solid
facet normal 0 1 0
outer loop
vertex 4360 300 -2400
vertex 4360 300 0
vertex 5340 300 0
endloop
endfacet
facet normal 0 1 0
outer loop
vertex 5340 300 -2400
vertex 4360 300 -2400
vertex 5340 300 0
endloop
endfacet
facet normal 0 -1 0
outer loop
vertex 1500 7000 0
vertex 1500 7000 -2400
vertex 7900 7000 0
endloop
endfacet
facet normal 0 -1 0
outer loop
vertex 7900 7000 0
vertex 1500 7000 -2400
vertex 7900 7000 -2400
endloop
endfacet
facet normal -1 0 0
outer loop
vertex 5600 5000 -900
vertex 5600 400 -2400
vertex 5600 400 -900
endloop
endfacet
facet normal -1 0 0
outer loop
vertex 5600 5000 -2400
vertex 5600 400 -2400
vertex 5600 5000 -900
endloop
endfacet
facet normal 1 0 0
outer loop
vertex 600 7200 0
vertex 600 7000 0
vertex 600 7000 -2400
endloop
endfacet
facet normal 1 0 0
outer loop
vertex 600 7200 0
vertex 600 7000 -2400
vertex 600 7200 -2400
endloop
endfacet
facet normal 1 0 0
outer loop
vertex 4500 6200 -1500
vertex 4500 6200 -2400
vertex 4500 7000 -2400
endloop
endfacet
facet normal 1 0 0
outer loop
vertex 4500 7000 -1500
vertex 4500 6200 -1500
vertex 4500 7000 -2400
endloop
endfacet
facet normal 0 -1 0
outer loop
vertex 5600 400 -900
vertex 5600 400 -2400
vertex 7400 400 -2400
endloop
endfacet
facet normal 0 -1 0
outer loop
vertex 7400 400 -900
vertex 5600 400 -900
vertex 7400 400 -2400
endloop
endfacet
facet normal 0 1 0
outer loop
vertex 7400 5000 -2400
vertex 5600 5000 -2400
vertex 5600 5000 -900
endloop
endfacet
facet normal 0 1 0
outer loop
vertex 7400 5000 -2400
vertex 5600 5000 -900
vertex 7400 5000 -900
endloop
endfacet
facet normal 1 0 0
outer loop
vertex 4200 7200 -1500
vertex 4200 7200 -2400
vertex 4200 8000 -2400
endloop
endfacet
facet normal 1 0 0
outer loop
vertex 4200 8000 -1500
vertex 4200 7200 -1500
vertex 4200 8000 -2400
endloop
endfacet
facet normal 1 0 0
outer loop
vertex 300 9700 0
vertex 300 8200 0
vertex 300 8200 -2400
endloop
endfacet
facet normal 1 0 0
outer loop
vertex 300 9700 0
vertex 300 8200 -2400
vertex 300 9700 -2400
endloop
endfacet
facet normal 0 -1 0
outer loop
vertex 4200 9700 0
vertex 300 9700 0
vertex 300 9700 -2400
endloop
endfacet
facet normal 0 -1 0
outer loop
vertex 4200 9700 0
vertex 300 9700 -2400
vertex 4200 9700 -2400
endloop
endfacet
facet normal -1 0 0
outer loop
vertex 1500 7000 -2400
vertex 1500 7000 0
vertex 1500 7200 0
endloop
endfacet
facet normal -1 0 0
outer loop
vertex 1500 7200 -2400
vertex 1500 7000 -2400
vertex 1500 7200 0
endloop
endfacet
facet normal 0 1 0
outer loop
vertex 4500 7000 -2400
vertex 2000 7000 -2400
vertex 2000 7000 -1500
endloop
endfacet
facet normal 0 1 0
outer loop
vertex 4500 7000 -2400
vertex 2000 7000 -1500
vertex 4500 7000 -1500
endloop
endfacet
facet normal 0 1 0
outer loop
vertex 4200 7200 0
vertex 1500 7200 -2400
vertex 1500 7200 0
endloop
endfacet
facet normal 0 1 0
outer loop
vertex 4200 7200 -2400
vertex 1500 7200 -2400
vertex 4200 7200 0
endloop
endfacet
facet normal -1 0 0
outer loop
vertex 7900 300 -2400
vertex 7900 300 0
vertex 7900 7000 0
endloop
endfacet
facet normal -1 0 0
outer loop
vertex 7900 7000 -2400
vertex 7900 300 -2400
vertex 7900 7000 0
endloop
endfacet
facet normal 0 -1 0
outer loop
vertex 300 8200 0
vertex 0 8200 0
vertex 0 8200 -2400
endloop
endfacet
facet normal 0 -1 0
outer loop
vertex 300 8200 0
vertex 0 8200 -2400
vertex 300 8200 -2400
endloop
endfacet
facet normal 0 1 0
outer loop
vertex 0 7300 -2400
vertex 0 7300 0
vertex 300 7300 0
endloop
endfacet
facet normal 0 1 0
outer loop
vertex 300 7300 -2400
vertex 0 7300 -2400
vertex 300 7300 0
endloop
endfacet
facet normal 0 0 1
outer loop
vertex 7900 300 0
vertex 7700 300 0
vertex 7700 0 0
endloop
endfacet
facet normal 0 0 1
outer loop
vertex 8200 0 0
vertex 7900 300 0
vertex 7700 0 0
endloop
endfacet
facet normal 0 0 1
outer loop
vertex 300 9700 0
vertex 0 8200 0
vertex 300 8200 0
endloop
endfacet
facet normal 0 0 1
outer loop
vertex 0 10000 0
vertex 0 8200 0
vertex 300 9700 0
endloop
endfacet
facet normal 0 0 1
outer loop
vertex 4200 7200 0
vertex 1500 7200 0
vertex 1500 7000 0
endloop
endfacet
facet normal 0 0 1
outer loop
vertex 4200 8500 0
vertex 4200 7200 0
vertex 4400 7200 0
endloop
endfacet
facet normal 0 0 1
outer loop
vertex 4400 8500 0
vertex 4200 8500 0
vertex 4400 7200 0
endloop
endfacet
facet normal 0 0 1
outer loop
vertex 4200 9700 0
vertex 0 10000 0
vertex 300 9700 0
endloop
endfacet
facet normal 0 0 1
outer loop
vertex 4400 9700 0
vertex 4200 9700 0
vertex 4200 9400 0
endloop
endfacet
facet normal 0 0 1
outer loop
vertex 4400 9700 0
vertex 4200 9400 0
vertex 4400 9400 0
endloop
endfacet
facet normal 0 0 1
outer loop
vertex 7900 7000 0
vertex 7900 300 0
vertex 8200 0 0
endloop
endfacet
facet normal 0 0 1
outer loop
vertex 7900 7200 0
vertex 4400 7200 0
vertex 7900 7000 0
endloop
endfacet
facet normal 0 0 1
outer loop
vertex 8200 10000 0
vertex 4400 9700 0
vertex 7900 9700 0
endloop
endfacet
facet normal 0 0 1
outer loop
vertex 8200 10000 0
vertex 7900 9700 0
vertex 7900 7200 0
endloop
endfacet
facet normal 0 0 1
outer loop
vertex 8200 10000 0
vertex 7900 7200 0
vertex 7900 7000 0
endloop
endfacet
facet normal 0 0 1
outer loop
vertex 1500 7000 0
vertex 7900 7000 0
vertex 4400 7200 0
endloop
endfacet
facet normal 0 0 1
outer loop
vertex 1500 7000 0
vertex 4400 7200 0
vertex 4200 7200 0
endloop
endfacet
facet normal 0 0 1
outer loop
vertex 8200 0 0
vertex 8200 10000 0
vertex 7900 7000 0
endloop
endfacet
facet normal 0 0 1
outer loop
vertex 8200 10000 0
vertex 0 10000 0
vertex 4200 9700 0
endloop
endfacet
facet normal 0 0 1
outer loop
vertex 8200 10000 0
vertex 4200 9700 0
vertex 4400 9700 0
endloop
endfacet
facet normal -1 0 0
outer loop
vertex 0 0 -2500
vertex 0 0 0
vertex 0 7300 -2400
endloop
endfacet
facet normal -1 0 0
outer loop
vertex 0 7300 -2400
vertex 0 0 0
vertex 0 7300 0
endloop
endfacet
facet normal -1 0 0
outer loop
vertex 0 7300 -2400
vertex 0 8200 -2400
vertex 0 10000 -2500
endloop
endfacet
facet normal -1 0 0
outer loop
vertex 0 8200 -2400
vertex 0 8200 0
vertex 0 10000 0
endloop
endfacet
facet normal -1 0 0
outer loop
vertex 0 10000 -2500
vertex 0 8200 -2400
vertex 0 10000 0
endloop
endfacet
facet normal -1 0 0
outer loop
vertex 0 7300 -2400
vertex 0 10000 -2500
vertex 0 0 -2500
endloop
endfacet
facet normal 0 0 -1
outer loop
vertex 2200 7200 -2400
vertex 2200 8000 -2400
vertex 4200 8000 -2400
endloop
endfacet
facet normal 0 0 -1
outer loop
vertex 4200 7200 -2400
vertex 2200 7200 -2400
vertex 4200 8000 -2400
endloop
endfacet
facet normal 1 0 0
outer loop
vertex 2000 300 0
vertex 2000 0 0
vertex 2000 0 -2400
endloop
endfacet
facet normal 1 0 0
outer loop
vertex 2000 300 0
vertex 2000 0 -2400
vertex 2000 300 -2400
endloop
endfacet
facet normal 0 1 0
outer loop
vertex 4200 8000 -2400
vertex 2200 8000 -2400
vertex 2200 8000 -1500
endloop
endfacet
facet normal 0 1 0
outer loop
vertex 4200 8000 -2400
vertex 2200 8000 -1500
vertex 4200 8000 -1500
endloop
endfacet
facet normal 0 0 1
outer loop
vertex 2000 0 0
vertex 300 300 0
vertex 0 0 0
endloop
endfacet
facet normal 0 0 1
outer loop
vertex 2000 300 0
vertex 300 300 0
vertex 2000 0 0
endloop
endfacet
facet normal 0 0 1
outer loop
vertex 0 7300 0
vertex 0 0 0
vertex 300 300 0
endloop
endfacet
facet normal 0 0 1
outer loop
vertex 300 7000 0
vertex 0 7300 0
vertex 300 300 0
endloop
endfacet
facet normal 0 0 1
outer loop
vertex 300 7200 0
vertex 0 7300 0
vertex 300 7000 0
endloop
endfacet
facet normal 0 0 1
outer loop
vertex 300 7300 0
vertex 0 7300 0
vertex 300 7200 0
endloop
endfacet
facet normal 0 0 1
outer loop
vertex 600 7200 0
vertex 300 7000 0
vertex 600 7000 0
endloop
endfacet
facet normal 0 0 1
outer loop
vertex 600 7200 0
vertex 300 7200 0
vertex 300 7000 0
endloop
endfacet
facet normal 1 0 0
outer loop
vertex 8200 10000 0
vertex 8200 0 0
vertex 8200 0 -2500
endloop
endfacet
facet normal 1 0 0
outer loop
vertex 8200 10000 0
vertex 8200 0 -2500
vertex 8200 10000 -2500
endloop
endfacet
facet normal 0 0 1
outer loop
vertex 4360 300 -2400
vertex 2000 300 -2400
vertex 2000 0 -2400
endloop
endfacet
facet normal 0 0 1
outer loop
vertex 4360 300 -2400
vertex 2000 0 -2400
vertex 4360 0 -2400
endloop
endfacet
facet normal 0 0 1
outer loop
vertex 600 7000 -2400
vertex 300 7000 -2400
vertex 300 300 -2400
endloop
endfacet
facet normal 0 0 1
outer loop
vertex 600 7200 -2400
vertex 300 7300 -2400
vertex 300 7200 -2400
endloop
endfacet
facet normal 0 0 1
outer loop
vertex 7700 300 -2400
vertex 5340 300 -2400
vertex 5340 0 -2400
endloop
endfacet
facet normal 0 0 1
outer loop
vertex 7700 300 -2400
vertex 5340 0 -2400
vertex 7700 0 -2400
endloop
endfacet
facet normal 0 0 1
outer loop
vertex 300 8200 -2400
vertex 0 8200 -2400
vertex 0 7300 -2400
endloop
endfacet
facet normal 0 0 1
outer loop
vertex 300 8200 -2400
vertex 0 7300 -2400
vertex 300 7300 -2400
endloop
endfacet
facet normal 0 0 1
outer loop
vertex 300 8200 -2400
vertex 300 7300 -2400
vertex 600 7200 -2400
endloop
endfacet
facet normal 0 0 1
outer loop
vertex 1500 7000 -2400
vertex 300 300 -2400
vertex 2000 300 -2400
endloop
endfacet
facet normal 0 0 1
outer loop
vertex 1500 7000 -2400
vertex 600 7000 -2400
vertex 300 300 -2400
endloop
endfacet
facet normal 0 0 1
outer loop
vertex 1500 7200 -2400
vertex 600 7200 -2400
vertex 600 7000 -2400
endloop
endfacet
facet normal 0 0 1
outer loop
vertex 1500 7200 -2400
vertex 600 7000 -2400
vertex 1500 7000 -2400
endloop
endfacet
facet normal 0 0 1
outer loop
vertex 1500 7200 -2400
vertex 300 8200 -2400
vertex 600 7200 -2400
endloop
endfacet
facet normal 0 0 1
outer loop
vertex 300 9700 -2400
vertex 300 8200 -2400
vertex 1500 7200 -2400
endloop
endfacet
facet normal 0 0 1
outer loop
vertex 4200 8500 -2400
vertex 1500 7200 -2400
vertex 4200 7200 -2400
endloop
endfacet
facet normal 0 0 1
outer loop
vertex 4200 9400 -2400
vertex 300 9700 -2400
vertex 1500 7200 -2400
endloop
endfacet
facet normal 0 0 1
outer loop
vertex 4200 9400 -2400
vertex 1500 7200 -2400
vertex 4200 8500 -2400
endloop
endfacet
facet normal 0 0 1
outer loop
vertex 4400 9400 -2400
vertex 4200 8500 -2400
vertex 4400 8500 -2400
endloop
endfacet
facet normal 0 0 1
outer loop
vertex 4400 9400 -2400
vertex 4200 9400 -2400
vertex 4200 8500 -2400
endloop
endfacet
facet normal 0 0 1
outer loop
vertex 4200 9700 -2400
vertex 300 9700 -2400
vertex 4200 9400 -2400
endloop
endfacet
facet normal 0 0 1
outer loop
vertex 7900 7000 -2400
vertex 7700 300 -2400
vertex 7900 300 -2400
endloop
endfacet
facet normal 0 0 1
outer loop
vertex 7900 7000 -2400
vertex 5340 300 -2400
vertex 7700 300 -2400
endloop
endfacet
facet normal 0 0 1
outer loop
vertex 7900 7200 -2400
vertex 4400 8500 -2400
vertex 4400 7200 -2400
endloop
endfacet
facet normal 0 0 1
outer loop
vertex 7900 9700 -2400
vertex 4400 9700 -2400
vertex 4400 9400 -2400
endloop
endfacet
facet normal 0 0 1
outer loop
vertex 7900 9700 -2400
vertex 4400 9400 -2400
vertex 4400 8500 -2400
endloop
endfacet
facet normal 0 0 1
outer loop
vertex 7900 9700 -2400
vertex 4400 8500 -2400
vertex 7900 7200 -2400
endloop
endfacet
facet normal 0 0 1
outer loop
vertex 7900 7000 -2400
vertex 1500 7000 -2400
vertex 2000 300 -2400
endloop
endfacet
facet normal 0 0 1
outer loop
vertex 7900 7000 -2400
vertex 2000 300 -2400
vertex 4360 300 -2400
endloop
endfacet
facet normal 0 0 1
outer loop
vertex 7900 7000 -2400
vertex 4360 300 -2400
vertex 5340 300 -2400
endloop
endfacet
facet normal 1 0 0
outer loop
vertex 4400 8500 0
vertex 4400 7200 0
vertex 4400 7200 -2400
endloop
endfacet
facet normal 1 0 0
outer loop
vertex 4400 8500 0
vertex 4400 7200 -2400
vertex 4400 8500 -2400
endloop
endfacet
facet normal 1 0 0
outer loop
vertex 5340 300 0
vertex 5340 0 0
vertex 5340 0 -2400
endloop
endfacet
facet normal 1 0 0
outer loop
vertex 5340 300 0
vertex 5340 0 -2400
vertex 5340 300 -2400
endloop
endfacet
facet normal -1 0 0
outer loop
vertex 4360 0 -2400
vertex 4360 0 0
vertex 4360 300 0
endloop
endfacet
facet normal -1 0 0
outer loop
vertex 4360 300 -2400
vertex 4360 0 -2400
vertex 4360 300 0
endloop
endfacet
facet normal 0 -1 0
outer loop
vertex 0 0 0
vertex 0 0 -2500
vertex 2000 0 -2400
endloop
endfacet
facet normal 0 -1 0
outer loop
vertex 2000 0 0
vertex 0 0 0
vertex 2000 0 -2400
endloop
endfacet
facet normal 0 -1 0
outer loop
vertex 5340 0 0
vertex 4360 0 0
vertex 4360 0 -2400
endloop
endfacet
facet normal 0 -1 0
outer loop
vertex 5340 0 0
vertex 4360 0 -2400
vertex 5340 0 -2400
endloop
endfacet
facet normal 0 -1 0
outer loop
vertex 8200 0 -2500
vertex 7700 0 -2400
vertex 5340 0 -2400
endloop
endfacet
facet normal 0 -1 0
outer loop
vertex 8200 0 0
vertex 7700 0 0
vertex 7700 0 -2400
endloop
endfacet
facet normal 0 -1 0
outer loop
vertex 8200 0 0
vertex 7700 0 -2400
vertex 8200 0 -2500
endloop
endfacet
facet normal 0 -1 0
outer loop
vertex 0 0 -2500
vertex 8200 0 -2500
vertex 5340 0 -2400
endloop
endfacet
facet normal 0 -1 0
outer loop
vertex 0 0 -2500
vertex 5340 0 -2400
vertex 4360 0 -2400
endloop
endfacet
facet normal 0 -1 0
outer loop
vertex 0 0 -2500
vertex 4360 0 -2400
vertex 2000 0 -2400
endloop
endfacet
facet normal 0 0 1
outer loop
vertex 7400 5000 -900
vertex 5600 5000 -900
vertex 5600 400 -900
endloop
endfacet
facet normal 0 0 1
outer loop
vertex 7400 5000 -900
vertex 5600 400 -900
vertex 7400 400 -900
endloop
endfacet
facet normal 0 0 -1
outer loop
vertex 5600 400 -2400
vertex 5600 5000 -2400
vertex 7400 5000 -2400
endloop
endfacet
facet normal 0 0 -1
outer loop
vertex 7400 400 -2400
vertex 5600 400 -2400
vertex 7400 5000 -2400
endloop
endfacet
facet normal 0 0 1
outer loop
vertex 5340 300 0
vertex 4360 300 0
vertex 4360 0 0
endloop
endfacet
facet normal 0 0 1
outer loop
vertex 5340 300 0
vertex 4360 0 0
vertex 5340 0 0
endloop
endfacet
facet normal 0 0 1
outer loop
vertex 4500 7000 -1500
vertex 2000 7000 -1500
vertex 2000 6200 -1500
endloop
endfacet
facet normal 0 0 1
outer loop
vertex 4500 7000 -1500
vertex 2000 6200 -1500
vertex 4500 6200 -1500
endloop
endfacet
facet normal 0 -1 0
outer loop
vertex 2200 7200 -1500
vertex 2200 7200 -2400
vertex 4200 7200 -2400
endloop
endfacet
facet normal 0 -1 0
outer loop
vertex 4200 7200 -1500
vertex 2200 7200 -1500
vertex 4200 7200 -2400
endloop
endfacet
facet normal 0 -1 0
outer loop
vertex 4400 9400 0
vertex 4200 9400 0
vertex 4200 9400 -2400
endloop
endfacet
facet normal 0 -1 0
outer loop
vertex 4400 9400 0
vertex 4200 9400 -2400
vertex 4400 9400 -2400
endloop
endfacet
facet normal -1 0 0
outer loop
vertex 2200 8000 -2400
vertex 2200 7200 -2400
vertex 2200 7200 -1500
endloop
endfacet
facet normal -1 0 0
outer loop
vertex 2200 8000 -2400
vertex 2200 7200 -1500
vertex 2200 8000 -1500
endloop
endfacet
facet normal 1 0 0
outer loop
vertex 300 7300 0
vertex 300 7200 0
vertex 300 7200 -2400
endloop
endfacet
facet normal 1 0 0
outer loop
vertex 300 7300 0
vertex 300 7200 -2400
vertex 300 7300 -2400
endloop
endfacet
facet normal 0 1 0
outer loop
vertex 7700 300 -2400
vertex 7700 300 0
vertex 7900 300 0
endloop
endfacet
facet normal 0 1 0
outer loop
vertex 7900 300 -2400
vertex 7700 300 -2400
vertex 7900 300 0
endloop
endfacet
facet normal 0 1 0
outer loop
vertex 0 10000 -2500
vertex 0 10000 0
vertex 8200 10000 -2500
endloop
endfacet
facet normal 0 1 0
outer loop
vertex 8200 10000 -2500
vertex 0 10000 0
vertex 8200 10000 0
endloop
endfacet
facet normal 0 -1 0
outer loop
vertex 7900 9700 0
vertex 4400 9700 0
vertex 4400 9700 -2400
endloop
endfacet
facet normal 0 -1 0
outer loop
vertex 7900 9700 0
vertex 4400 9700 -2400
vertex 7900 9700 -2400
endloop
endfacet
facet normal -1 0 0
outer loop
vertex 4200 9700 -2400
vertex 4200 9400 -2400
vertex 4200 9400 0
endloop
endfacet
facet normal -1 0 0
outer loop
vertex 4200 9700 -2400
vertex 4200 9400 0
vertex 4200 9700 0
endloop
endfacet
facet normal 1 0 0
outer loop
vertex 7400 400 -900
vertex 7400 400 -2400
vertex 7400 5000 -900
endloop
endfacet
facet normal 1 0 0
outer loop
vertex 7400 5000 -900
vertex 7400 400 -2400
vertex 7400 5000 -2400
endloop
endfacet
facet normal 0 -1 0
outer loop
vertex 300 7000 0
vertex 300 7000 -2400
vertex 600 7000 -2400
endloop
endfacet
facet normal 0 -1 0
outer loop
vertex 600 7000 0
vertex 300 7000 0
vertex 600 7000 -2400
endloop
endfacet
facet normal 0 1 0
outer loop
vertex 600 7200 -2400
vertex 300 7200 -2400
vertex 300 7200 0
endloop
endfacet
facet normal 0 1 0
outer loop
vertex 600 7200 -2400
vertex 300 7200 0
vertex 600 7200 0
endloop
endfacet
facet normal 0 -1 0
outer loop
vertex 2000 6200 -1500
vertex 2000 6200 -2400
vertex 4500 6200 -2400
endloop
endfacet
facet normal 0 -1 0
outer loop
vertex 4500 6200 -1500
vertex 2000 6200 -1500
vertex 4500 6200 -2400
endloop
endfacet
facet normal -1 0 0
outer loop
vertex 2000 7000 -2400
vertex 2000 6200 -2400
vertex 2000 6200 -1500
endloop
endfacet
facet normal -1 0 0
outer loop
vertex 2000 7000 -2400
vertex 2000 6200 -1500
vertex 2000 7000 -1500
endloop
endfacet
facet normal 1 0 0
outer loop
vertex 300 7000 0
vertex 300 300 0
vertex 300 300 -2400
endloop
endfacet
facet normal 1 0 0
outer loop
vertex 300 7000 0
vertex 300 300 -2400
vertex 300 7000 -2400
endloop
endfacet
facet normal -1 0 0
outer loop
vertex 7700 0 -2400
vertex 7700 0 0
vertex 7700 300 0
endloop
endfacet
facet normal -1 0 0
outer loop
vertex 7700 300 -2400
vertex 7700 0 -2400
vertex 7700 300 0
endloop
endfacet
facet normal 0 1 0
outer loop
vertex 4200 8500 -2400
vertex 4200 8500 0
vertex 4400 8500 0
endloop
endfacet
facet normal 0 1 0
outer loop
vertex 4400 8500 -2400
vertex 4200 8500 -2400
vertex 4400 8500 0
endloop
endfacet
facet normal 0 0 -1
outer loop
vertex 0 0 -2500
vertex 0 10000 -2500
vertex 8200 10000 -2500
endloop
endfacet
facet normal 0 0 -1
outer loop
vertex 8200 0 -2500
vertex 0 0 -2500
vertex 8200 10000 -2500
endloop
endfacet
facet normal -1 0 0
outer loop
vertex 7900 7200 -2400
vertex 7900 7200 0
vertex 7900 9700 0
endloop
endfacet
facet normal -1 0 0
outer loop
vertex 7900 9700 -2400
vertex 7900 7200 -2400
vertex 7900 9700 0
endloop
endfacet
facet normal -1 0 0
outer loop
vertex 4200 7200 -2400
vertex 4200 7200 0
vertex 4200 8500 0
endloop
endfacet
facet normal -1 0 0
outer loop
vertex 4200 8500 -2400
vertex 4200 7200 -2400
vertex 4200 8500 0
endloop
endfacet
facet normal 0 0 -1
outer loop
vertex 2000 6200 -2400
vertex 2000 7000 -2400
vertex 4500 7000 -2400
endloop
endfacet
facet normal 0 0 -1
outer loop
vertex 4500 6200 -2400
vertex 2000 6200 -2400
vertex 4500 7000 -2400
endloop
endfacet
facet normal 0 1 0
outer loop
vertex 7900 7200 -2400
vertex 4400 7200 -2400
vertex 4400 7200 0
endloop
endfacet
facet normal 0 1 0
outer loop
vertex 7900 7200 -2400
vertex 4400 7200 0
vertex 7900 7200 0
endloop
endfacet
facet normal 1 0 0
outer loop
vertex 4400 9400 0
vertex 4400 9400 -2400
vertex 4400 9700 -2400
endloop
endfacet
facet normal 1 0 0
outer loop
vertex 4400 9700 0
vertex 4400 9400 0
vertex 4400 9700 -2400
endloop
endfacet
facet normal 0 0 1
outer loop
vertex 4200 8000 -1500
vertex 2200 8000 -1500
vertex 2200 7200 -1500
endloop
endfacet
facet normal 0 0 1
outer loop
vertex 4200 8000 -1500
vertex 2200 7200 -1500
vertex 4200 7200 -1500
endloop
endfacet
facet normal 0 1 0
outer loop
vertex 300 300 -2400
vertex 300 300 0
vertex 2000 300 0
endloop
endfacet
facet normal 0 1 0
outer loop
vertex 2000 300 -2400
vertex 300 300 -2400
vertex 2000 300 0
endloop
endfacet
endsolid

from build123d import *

# Parameters (mm, degrees)
F0_W      = 8200
F0_H      = 10000
F3_DEPTH  = 2500
F1_W      = 7600
F1_H      = 9400
F4_DEPTH  = 2400
F2_W      = 2360
F2_H      = 300
F5_DEPTH  = 2400
F6_W      = 7600
F6_H      = 200
F7_DEPTH  = 2400
F8_W      = 200
F8_H      = 2500
F9_DEPTH  = 2400
F10_W     = 900
F10_H     = 200
F10_W_2   = 200
F10_H_2   = 900
F10_W_3   = 300
F11_DEPTH = 2400
F12_W     = 2000
F12_H     = 800
F13_DEPTH = 900
F14_W     = 1800
F14_H     = 4600
F15_DEPTH = 1500
F16_W     = 2500
F16_H     = 800
F17_DEPTH = 900


with BuildPart() as f3:
    # F0 (on Top) → F3 (new body)
    with BuildSketch(Plane.XY):
        with Locations((4100, 5000)):
            Rectangle(F0_W, F0_H)
    extrude(amount=-F3_DEPTH)

    # F1 (on face) → F4 (cut)
    with BuildSketch(Plane.XY):
        with Locations((4100, 5000)):
            Rectangle(F1_W, F1_H)
    extrude(amount=-F4_DEPTH, mode=Mode.SUBTRACT)

    # F2 (on face) → F5 (cut)
    with BuildSketch(Plane.XY):
        with Locations((3180, 150)):
            Rectangle(F2_W, F2_H)
        with Locations((6520, 150)):
            Rectangle(F2_W, F2_H)
    extrude(amount=-F5_DEPTH, mode=Mode.SUBTRACT)

    # F6 (on face) → F7 (join)
    with BuildSketch(Plane.XY.offset(-2400)):
        with Locations((4100, 7100)):
            Rectangle(F6_W, F6_H)
    extrude(amount=F7_DEPTH)

    # F8 (on face) → F9 (join)
    with BuildSketch(Plane.XY.offset(-2400)):
        with Locations((4300, 8450)):
            Rectangle(F8_W, F8_H)
    extrude(amount=F9_DEPTH)

    # F10 (on face) → F11 (cut)
    with BuildSketch(Plane.XY):
        with Locations((1050, 7100)):
            Rectangle(F10_W, F10_H)
        with Locations((4300, 8950)):
            Rectangle(F10_W_2, F10_H_2)
        with Locations((150, 7750)):
            Rectangle(F10_W_3, F10_H_2)
    extrude(amount=-F11_DEPTH, mode=Mode.SUBTRACT)


with BuildPart() as f13:
    # F12 (on face) → F13 (new body)
    with BuildSketch(Plane.XY.offset(-2400)):
        with Locations((3200, 7600)):
            Rectangle(F12_W, F12_H)
    extrude(amount=F13_DEPTH)


with BuildPart() as f15:
    # F14 (on face) → F15 (new body)
    with BuildSketch(Plane.XY.offset(-2400)):
        with Locations((6500, 2700)):
            Rectangle(F14_W, F14_H)
    extrude(amount=F15_DEPTH)


with BuildPart() as f17:
    # F16 (on face) → F17 (new body)
    with BuildSketch(Plane.XY.offset(-2400)):
        with Locations((3250, 6600)):
            Rectangle(F16_W, F16_H)
    extrude(amount=F17_DEPTH)


solid = Compound([f3.part, f13.part, f15.part, f17.part])
